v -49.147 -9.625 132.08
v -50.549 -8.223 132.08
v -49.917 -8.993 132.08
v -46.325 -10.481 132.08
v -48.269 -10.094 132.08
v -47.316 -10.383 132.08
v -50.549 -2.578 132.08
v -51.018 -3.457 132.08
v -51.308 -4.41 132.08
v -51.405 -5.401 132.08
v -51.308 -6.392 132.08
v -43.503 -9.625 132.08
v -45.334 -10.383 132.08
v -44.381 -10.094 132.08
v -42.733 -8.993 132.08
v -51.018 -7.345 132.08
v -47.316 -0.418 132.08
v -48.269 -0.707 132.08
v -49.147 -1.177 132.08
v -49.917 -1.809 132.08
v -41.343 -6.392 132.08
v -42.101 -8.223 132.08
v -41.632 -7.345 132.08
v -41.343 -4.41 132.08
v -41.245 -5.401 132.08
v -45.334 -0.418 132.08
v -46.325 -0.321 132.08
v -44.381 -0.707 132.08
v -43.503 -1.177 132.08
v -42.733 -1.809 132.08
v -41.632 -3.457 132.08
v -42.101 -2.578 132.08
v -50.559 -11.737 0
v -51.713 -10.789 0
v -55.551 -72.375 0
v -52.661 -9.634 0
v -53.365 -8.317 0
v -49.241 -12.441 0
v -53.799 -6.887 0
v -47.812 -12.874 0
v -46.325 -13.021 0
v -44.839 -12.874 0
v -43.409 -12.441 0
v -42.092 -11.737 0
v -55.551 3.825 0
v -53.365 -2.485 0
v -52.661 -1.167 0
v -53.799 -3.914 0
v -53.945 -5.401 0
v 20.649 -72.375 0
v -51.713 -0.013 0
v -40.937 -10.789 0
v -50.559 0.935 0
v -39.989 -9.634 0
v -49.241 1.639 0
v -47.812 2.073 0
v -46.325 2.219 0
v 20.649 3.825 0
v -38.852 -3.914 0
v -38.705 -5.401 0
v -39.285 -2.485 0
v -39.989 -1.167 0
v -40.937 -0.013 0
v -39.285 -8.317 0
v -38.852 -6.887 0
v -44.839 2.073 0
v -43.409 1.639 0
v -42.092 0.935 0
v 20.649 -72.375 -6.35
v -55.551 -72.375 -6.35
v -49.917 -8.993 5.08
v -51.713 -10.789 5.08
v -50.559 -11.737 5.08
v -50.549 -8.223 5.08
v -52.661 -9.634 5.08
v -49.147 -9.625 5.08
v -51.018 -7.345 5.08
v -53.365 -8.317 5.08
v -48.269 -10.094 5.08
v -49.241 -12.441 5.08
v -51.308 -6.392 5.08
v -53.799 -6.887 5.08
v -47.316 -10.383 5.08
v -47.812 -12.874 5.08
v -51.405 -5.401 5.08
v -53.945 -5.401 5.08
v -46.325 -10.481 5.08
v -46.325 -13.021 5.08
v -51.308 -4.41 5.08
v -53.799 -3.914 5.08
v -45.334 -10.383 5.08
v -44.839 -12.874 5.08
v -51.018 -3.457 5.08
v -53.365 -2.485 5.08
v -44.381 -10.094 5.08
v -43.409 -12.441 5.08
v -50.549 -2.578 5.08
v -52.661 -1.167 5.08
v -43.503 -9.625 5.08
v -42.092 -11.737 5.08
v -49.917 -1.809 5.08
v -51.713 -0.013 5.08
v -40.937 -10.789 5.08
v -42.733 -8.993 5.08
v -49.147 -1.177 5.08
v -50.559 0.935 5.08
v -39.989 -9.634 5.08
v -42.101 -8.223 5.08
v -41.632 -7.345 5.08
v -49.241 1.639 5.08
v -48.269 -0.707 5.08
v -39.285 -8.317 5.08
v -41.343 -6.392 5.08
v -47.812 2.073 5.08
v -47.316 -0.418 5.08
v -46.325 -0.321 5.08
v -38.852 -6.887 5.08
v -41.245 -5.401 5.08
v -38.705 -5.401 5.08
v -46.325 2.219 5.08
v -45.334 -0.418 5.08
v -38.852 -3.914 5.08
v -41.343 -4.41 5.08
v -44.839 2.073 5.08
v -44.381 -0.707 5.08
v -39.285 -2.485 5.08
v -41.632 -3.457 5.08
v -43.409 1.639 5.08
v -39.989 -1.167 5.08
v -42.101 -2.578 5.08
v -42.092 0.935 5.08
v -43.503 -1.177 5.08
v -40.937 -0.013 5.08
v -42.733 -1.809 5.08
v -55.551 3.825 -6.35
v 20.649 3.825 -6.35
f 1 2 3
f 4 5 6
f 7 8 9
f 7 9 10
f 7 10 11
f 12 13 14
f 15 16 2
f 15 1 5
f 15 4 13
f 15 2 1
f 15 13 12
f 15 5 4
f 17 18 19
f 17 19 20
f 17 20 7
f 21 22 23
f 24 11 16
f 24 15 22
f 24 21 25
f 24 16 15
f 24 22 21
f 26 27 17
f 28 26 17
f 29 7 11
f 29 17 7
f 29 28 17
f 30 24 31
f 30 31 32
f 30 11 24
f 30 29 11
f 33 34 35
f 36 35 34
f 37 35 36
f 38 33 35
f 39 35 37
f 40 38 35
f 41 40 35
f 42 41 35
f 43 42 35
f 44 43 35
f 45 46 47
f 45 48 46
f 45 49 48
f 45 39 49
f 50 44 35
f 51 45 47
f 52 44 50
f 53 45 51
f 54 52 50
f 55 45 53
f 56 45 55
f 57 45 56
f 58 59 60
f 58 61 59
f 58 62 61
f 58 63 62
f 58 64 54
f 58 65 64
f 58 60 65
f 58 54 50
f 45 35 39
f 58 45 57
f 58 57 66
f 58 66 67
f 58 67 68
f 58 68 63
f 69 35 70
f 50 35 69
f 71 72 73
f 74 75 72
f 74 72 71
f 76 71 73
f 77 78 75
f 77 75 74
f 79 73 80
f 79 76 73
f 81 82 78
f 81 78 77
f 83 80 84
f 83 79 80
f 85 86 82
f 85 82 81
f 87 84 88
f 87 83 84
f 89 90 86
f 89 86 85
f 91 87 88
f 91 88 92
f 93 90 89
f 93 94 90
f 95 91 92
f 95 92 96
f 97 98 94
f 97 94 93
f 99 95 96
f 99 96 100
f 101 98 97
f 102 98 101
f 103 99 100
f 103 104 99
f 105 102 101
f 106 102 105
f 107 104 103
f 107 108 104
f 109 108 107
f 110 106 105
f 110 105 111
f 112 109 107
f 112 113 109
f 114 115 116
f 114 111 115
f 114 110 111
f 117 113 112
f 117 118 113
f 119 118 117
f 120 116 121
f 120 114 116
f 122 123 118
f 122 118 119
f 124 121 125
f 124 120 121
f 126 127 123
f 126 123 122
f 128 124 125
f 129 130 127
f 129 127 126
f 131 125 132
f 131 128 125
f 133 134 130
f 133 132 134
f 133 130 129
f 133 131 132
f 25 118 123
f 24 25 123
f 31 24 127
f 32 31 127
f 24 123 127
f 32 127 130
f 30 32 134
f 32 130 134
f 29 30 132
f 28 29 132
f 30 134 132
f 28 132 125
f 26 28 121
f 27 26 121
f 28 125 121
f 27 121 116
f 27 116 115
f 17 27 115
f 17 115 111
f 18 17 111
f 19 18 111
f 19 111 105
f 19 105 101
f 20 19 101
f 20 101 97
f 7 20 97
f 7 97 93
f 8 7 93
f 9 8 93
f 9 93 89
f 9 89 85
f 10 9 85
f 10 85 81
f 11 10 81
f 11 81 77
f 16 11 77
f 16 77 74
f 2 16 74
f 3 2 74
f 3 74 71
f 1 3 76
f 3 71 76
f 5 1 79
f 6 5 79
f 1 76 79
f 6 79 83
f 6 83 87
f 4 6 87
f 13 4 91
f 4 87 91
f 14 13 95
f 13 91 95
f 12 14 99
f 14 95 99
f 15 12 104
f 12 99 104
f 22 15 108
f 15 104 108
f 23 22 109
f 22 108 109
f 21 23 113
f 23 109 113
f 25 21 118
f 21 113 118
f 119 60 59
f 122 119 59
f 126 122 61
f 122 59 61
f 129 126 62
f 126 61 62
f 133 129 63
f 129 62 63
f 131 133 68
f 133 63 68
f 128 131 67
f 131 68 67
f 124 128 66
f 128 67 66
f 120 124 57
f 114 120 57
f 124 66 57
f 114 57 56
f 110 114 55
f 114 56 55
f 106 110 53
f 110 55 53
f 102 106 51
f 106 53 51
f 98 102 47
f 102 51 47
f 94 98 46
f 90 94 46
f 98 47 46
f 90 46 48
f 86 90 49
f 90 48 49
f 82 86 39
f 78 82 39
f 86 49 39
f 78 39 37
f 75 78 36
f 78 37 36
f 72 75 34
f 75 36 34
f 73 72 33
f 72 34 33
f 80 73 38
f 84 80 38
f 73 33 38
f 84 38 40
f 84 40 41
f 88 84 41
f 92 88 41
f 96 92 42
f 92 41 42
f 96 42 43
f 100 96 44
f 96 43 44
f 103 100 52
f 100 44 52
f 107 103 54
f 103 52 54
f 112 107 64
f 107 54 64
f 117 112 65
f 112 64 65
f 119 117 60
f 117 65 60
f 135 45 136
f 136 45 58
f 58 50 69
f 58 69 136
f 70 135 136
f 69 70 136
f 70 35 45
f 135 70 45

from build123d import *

# Parameters (mm, degrees)
F0_W     = 76.2
F0_H     = 76.2
F0_R     = 7.62
F0_R_2   = 5.08
F1_DEPTH = 6.35
F2_DEPTH = 132.08
F3_DEPTH = 5.08


# Not quite as in the source:
# - a feature names something its author has since deleted; it is built from what else it names


with BuildPart() as f1:
    # F0 (on Top) → F1 (new body)
    with BuildSketch(Plane.XY):
        with Locations((-17.4512108788, -34.2747404939)):
            Rectangle(F0_W, F0_H)
        with Locations((-46.3251647948, -5.4007865778)):
            Circle(F0_R, mode=Mode.SUBTRACT)
        with Locations((-46.3251647948, -5.4007865778)):
            Circle(F0_R)
        with Locations((-46.3251647948, -5.4007865778)):
            Circle(F0_R_2, mode=Mode.SUBTRACT)
        with Locations((-46.3251647948, -5.4007865778)):
            Circle(F0_R_2)
    extrude(amount=-F1_DEPTH)

    # F0 (on Top) → F2 (join)
    with BuildSketch(Plane.XY):
        with Locations((-46.3251647948, -5.4007865778)):
            Circle(F0_R_2)
    extrude(amount=F2_DEPTH)

    # F0 (on Top) → F3 (join)
    with BuildSketch(Plane.XY):
        with Locations((-46.3251647948, -5.4007865778)):
            Circle(F0_R)
        with Locations((-46.3251647948, -5.4007865778)):
            Circle(F0_R_2, mode=Mode.SUBTRACT)
    extrude(amount=F3_DEPTH)


solid = f1.part
